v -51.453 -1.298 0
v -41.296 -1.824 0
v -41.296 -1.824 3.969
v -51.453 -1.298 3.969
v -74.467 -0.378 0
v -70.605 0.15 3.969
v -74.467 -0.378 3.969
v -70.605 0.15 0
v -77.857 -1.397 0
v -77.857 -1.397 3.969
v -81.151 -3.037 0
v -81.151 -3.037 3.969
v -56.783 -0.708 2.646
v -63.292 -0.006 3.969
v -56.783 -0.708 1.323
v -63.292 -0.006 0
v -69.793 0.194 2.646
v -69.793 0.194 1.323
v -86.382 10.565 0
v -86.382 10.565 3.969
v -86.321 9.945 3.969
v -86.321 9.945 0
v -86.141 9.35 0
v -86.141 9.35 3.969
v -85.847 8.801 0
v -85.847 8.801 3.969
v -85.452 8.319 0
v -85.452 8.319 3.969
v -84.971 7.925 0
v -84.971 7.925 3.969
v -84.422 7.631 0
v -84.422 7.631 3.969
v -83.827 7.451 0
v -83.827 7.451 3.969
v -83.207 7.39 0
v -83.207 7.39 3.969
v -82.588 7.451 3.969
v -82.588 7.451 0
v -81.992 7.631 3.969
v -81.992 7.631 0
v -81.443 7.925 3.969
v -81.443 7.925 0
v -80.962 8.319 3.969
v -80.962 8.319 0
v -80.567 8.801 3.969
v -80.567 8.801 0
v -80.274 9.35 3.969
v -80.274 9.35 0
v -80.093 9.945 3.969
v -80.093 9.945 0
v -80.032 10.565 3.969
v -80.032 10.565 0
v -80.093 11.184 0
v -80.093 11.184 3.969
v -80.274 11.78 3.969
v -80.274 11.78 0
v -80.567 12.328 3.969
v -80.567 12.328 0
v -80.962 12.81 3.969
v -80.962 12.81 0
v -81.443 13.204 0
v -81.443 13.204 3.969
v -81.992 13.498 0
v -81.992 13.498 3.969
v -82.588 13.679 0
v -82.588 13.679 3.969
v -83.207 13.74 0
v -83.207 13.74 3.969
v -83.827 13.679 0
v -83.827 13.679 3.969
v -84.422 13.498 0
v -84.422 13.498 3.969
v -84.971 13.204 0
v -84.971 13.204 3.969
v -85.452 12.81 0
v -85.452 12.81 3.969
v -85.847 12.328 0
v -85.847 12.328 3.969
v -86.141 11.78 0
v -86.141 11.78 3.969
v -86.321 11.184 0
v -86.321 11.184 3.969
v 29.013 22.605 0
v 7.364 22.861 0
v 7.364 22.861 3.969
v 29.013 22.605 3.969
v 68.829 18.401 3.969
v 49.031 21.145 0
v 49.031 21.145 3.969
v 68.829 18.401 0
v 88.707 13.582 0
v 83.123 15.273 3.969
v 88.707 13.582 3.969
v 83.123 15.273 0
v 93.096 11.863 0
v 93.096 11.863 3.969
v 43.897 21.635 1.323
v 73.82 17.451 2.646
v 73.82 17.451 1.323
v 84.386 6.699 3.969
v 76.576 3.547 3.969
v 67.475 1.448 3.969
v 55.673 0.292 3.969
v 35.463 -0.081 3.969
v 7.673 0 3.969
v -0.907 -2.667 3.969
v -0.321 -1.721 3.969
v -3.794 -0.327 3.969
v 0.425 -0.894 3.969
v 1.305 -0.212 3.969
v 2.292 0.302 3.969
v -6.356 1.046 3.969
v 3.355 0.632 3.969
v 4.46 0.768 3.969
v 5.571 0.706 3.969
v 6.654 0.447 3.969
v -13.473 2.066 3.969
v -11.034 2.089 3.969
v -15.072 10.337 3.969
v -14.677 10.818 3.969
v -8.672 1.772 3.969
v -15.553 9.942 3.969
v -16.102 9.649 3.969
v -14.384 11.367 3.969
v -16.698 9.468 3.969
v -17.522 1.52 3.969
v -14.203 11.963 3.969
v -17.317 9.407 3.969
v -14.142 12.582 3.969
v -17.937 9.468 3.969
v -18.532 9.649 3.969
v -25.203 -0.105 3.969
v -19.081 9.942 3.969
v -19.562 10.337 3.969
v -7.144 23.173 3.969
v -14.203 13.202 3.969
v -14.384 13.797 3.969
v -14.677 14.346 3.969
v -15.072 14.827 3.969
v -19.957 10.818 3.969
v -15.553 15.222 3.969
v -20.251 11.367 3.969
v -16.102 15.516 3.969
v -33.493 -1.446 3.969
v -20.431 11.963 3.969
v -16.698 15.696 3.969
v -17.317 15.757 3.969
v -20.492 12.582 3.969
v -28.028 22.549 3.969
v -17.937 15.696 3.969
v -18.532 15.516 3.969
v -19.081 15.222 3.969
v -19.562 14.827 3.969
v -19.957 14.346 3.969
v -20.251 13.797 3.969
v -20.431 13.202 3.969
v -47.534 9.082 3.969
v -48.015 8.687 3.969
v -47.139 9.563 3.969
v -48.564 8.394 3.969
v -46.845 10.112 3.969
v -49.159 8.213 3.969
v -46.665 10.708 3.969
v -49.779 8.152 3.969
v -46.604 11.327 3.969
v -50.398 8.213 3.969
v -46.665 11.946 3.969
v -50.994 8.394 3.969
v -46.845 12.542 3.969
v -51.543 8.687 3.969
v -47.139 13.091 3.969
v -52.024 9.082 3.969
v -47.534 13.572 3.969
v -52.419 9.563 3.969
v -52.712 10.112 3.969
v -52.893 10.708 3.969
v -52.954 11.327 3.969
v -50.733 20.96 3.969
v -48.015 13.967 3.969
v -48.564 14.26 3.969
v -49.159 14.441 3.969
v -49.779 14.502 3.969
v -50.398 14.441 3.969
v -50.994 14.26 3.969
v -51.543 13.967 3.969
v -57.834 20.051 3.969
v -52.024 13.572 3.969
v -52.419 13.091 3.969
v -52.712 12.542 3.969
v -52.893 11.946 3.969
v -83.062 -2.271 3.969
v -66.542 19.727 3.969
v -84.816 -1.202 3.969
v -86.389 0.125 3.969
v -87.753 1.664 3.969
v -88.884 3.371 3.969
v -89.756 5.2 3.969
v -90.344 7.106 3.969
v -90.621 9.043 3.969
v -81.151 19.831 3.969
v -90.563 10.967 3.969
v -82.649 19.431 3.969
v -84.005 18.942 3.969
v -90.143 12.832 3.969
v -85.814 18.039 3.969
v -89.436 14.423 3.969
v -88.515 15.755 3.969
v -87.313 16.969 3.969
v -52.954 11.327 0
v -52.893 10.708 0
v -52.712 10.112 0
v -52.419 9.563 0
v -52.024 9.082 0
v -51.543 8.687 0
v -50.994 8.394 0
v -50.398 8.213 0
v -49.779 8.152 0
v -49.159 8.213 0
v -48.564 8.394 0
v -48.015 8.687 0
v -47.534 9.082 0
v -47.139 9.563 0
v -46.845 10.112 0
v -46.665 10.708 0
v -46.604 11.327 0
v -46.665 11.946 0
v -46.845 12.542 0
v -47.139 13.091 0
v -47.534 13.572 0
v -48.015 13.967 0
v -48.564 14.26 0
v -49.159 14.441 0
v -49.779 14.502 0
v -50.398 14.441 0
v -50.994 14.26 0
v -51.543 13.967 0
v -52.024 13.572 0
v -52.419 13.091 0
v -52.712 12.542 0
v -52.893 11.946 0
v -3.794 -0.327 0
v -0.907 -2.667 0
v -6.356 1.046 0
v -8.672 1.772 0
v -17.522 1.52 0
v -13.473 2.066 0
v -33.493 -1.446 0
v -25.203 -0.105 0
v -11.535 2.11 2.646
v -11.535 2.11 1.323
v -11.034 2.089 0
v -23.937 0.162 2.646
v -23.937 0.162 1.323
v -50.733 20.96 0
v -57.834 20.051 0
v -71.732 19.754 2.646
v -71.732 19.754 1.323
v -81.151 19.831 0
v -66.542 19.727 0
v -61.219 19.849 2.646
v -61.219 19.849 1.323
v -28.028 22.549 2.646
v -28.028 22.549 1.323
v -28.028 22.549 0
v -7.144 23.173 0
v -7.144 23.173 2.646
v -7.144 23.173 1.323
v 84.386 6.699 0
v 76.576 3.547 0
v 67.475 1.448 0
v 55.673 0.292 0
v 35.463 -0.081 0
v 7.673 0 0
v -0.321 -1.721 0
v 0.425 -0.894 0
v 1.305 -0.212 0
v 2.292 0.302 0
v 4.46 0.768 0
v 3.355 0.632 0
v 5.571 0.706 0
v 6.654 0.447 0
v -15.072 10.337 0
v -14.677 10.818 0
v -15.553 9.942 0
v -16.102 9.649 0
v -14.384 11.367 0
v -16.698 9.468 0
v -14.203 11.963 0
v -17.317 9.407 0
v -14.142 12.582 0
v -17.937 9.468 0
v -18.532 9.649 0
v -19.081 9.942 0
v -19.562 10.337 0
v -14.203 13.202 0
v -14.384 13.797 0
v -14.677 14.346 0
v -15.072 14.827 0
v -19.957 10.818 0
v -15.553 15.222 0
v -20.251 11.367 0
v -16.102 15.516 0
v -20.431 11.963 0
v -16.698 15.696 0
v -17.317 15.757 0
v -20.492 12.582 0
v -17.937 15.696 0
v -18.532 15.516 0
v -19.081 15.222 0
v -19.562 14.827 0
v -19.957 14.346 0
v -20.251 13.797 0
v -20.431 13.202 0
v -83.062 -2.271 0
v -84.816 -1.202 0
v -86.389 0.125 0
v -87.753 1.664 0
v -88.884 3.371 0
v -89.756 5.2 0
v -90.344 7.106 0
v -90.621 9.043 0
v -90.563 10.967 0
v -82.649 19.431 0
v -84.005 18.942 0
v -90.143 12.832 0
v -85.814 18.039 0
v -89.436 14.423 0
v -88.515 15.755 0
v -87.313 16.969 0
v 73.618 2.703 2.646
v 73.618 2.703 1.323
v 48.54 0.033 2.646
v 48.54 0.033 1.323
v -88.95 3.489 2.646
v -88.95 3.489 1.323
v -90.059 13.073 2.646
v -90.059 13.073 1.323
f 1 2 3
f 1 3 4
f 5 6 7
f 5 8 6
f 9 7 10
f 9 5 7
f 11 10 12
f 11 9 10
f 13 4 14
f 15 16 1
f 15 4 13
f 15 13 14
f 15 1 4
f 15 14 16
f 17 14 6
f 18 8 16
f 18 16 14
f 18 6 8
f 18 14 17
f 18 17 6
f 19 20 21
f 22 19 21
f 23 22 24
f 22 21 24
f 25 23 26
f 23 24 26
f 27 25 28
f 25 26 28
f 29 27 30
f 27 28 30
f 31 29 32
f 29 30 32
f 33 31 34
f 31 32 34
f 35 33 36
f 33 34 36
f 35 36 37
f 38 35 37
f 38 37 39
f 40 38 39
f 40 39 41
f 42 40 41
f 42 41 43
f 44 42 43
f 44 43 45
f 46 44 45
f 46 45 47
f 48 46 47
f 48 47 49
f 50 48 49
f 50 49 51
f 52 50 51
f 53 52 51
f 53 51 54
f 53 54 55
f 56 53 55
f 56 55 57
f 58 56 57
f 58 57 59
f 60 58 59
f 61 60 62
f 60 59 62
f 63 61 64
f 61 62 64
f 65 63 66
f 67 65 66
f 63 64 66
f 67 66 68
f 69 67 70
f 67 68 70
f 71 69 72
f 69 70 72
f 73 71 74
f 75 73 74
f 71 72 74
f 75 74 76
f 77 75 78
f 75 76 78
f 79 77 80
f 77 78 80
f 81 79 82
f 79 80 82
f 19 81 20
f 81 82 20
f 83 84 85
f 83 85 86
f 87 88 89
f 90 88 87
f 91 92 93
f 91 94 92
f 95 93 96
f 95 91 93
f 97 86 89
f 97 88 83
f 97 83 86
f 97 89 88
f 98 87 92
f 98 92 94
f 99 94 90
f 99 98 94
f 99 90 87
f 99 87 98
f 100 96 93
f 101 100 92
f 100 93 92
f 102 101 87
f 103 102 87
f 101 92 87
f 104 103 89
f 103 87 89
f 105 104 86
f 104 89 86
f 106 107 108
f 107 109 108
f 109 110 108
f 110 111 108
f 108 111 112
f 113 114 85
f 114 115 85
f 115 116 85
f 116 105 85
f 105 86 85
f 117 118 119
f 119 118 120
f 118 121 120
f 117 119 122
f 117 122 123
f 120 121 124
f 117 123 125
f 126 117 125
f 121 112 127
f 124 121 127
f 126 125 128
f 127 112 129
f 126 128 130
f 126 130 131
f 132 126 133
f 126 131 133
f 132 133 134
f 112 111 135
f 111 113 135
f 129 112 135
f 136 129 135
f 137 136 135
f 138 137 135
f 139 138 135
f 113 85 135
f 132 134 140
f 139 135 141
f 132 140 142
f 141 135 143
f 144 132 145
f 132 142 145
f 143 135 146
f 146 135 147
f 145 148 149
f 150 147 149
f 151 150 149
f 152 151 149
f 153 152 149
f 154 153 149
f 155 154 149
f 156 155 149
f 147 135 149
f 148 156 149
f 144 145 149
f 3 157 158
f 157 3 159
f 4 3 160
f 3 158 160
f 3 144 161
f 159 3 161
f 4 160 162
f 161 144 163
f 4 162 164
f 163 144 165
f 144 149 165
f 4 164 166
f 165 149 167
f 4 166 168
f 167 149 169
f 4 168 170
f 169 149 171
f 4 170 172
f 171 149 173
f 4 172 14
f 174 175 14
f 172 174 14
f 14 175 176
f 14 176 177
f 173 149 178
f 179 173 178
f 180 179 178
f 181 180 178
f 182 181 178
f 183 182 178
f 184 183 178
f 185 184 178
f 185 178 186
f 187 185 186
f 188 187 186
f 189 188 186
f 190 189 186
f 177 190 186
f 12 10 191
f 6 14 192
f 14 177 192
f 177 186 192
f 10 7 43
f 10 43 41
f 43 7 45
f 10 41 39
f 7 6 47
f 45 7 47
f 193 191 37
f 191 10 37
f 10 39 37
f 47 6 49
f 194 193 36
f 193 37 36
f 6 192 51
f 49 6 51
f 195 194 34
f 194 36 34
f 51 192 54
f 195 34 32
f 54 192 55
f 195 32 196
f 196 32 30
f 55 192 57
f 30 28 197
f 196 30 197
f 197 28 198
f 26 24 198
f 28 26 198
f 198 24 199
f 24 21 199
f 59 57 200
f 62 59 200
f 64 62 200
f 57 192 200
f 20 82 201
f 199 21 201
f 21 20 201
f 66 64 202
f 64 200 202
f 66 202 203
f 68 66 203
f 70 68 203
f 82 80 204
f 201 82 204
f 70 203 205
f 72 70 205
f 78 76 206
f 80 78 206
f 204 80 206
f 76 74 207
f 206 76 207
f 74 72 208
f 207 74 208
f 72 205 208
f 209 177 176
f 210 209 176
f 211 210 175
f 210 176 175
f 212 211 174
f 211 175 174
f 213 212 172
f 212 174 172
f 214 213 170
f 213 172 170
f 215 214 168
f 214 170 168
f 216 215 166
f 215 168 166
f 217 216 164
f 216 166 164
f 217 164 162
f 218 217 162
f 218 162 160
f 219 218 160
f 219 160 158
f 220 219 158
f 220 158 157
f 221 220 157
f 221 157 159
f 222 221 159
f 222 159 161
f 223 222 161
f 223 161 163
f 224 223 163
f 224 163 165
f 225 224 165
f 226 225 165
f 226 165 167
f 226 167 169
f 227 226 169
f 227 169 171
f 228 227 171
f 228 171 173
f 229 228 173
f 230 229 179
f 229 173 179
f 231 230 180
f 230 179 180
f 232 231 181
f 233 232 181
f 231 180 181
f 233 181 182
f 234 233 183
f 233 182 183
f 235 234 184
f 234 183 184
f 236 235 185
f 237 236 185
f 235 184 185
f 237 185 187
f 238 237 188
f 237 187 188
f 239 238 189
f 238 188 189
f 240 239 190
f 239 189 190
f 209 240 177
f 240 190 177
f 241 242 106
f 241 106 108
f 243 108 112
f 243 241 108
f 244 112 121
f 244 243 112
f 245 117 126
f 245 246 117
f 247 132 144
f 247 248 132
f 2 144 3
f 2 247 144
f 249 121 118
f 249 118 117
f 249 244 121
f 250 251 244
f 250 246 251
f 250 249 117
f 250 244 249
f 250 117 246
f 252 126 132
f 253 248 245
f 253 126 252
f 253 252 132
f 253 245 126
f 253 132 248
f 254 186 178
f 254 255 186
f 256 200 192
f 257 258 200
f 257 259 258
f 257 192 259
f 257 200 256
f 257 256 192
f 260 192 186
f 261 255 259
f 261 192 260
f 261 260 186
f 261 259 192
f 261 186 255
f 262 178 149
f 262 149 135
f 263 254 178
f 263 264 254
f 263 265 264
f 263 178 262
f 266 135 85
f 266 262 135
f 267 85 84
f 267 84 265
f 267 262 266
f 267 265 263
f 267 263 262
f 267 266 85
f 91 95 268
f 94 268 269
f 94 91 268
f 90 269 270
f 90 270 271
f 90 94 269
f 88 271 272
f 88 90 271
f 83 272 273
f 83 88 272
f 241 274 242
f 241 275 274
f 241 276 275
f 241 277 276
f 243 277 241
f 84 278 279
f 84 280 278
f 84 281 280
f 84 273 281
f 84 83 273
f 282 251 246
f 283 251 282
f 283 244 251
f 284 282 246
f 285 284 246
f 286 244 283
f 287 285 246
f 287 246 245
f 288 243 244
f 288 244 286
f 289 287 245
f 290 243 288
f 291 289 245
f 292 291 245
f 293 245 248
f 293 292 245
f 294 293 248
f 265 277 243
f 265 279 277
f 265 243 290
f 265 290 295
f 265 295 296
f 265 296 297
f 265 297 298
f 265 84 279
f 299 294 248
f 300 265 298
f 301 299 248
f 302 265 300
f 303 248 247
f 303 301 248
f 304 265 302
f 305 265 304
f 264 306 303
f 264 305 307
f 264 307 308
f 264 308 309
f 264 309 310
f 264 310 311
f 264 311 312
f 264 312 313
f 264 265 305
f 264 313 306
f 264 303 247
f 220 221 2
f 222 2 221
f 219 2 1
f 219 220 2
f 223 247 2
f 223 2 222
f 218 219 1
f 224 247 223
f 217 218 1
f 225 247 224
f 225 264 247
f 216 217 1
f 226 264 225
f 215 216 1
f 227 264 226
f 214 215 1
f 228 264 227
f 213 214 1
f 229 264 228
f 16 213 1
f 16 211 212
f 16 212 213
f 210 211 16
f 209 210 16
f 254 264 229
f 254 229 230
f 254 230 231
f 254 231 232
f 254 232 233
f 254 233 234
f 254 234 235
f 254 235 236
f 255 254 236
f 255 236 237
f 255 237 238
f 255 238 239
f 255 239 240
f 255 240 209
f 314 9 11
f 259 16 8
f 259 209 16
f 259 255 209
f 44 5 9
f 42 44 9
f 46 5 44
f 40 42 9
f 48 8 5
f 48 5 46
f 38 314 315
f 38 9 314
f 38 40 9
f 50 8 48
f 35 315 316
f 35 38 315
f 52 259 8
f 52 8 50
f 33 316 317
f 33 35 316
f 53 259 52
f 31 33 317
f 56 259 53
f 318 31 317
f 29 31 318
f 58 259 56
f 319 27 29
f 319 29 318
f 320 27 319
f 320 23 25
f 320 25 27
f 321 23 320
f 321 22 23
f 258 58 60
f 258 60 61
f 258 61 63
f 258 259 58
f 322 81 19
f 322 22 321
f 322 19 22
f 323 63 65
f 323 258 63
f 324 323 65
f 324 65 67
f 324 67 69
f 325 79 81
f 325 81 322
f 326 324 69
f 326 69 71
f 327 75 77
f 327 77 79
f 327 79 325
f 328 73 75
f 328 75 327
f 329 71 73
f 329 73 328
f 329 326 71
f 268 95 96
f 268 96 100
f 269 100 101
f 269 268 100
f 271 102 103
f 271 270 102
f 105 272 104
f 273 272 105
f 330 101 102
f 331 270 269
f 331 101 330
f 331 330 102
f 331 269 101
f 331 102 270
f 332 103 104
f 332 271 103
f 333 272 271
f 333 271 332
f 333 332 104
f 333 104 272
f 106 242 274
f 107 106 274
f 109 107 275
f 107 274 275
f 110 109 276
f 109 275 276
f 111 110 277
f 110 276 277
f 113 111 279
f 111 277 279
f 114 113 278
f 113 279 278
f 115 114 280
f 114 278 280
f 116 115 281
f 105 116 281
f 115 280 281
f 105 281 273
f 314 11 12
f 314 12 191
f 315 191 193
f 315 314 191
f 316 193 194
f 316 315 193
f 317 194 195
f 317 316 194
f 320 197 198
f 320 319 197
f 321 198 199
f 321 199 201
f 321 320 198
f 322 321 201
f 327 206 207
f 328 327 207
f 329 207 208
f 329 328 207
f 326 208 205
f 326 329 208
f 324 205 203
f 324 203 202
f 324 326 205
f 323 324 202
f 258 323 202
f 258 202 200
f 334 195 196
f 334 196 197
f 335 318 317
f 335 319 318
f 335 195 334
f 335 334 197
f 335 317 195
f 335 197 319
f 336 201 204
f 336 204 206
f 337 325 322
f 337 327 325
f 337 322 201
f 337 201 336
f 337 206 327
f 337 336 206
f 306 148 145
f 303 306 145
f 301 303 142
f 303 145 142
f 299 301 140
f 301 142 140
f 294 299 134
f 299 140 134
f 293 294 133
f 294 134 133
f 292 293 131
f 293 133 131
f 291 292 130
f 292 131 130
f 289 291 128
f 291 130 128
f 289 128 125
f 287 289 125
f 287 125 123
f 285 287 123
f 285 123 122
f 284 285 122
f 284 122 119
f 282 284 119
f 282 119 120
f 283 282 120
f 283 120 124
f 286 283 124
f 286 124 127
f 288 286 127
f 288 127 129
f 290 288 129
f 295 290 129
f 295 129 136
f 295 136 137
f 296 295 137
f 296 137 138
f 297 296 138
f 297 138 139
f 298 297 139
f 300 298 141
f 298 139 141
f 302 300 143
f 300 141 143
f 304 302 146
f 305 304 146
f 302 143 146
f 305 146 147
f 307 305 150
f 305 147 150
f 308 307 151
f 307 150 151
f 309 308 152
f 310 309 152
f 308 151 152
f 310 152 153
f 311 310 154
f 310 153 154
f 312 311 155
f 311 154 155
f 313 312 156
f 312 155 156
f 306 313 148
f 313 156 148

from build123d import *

# Parameters (mm, degrees)
F1_DEPTH = 3.96875
F2_D     = 6.35
F3_D     = 6.35


with BuildPart() as f1:
    # F0 (on Top) → F1 (new body)
    with BuildSketch(Plane.XY):
        with BuildLine():
            add(Edge.make_bspline(
                [(93.0961013775, 11.8631264067), (73.0208323512, -1.8265877953), (59.8314115865, 0), (7.6732839915, 0)],
                knots=[0, 0, 0, 0, 86.2426315595, 86.2426315595, 86.2426315595, 86.2426315595], degree=3))
            add(Edge.make_bspline(
                [(7.3635370912, 22.8609638917), (45.8569088961, 23.6332072416), (80.4890639518, 17.6334698365), (93.0961013775, 11.8631264067)],
                knots=[0, 0, 0, 0, 86.4350913023, 86.4350913023, 86.4350913023, 86.4350913023], degree=3))
            add(Edge.make_bspline(
                [(-50.7329378175, 20.9600568183), (-28.6348905119, 23.0391732855), (-2.4380154521, 23.6332072416), (7.3635370912, 22.8609638917)],
                knots=[0, 0, 0, 0, 58.1275652726, 58.1275652726, 58.1275652726, 58.1275652726], degree=3))
            add(Edge.make_bspline(
                [(-81.150870805, 19.8313930948), (-72.6527741432, 19.950199886), (-60.8315071405, 19.059149745), (-50.7329378175, 20.9600568183)],
                knots=[0, 0, 0, 0, 30.4388654361, 30.4388654361, 30.4388654361, 30.4388654361], degree=3))
            add(Edge.make_bspline(
                [(-81.150870805, -3.0372931352), (-91.1866208845, 0), (-96.1764965988, 16.4454019242), (-81.150870805, 19.8313930948)],
                knots=[0, 0, 0, 0, 22.8686862301, 22.8686862301, 22.8686862301, 22.8686862301], degree=3))
            add(Edge.make_bspline(
                [(-41.2958105253, -1.8235209079), (-58.2979012822, -1.90700734), (-70.3425093809, 3.5678162715), (-81.150870805, -3.0372931352)],
                knots=[0, 0, 0, 0, 39.8735385051, 39.8735385051, 39.8735385051, 39.8735385051], degree=3))
            add(Edge.make_bspline(
                [(-0.9071079771, -2.6666779982), (-11.7089183609, 7.7004259843), (-20.3979939932, -2.0482919491), (-41.2958105253, -1.8235209079)],
                knots=[0, 0, 0, 0, 40.3975024897, 40.3975024897, 40.3975024897, 40.3975024897], degree=3))
            ThreePointArc((-0.9071079771, -2.6666779982), (2.8162542913, 0.4905240496), (7.6732839915, 0))
        make_face()
    extrude(amount=F1_DEPTH)

    # F2 (through all)
    with Locations(Plane(origin=(0, 0, 0), x_dir=(1, 0, 0), z_dir=(0, 0, -1))):
        with Locations((-49.7787126682, -11.3269922778)):
            Hole(F2_D / 2)

    # F3 (through all)
    with Locations(Plane(origin=(0, 0, 0), x_dir=(1, 0, 0), z_dir=(0, 0, -1))):
        with Locations((-83.2072975638, -10.5645472046), (-17.3172454044, -12.5823580943)):
            Hole(F3_D / 2)


solid = f1.part
